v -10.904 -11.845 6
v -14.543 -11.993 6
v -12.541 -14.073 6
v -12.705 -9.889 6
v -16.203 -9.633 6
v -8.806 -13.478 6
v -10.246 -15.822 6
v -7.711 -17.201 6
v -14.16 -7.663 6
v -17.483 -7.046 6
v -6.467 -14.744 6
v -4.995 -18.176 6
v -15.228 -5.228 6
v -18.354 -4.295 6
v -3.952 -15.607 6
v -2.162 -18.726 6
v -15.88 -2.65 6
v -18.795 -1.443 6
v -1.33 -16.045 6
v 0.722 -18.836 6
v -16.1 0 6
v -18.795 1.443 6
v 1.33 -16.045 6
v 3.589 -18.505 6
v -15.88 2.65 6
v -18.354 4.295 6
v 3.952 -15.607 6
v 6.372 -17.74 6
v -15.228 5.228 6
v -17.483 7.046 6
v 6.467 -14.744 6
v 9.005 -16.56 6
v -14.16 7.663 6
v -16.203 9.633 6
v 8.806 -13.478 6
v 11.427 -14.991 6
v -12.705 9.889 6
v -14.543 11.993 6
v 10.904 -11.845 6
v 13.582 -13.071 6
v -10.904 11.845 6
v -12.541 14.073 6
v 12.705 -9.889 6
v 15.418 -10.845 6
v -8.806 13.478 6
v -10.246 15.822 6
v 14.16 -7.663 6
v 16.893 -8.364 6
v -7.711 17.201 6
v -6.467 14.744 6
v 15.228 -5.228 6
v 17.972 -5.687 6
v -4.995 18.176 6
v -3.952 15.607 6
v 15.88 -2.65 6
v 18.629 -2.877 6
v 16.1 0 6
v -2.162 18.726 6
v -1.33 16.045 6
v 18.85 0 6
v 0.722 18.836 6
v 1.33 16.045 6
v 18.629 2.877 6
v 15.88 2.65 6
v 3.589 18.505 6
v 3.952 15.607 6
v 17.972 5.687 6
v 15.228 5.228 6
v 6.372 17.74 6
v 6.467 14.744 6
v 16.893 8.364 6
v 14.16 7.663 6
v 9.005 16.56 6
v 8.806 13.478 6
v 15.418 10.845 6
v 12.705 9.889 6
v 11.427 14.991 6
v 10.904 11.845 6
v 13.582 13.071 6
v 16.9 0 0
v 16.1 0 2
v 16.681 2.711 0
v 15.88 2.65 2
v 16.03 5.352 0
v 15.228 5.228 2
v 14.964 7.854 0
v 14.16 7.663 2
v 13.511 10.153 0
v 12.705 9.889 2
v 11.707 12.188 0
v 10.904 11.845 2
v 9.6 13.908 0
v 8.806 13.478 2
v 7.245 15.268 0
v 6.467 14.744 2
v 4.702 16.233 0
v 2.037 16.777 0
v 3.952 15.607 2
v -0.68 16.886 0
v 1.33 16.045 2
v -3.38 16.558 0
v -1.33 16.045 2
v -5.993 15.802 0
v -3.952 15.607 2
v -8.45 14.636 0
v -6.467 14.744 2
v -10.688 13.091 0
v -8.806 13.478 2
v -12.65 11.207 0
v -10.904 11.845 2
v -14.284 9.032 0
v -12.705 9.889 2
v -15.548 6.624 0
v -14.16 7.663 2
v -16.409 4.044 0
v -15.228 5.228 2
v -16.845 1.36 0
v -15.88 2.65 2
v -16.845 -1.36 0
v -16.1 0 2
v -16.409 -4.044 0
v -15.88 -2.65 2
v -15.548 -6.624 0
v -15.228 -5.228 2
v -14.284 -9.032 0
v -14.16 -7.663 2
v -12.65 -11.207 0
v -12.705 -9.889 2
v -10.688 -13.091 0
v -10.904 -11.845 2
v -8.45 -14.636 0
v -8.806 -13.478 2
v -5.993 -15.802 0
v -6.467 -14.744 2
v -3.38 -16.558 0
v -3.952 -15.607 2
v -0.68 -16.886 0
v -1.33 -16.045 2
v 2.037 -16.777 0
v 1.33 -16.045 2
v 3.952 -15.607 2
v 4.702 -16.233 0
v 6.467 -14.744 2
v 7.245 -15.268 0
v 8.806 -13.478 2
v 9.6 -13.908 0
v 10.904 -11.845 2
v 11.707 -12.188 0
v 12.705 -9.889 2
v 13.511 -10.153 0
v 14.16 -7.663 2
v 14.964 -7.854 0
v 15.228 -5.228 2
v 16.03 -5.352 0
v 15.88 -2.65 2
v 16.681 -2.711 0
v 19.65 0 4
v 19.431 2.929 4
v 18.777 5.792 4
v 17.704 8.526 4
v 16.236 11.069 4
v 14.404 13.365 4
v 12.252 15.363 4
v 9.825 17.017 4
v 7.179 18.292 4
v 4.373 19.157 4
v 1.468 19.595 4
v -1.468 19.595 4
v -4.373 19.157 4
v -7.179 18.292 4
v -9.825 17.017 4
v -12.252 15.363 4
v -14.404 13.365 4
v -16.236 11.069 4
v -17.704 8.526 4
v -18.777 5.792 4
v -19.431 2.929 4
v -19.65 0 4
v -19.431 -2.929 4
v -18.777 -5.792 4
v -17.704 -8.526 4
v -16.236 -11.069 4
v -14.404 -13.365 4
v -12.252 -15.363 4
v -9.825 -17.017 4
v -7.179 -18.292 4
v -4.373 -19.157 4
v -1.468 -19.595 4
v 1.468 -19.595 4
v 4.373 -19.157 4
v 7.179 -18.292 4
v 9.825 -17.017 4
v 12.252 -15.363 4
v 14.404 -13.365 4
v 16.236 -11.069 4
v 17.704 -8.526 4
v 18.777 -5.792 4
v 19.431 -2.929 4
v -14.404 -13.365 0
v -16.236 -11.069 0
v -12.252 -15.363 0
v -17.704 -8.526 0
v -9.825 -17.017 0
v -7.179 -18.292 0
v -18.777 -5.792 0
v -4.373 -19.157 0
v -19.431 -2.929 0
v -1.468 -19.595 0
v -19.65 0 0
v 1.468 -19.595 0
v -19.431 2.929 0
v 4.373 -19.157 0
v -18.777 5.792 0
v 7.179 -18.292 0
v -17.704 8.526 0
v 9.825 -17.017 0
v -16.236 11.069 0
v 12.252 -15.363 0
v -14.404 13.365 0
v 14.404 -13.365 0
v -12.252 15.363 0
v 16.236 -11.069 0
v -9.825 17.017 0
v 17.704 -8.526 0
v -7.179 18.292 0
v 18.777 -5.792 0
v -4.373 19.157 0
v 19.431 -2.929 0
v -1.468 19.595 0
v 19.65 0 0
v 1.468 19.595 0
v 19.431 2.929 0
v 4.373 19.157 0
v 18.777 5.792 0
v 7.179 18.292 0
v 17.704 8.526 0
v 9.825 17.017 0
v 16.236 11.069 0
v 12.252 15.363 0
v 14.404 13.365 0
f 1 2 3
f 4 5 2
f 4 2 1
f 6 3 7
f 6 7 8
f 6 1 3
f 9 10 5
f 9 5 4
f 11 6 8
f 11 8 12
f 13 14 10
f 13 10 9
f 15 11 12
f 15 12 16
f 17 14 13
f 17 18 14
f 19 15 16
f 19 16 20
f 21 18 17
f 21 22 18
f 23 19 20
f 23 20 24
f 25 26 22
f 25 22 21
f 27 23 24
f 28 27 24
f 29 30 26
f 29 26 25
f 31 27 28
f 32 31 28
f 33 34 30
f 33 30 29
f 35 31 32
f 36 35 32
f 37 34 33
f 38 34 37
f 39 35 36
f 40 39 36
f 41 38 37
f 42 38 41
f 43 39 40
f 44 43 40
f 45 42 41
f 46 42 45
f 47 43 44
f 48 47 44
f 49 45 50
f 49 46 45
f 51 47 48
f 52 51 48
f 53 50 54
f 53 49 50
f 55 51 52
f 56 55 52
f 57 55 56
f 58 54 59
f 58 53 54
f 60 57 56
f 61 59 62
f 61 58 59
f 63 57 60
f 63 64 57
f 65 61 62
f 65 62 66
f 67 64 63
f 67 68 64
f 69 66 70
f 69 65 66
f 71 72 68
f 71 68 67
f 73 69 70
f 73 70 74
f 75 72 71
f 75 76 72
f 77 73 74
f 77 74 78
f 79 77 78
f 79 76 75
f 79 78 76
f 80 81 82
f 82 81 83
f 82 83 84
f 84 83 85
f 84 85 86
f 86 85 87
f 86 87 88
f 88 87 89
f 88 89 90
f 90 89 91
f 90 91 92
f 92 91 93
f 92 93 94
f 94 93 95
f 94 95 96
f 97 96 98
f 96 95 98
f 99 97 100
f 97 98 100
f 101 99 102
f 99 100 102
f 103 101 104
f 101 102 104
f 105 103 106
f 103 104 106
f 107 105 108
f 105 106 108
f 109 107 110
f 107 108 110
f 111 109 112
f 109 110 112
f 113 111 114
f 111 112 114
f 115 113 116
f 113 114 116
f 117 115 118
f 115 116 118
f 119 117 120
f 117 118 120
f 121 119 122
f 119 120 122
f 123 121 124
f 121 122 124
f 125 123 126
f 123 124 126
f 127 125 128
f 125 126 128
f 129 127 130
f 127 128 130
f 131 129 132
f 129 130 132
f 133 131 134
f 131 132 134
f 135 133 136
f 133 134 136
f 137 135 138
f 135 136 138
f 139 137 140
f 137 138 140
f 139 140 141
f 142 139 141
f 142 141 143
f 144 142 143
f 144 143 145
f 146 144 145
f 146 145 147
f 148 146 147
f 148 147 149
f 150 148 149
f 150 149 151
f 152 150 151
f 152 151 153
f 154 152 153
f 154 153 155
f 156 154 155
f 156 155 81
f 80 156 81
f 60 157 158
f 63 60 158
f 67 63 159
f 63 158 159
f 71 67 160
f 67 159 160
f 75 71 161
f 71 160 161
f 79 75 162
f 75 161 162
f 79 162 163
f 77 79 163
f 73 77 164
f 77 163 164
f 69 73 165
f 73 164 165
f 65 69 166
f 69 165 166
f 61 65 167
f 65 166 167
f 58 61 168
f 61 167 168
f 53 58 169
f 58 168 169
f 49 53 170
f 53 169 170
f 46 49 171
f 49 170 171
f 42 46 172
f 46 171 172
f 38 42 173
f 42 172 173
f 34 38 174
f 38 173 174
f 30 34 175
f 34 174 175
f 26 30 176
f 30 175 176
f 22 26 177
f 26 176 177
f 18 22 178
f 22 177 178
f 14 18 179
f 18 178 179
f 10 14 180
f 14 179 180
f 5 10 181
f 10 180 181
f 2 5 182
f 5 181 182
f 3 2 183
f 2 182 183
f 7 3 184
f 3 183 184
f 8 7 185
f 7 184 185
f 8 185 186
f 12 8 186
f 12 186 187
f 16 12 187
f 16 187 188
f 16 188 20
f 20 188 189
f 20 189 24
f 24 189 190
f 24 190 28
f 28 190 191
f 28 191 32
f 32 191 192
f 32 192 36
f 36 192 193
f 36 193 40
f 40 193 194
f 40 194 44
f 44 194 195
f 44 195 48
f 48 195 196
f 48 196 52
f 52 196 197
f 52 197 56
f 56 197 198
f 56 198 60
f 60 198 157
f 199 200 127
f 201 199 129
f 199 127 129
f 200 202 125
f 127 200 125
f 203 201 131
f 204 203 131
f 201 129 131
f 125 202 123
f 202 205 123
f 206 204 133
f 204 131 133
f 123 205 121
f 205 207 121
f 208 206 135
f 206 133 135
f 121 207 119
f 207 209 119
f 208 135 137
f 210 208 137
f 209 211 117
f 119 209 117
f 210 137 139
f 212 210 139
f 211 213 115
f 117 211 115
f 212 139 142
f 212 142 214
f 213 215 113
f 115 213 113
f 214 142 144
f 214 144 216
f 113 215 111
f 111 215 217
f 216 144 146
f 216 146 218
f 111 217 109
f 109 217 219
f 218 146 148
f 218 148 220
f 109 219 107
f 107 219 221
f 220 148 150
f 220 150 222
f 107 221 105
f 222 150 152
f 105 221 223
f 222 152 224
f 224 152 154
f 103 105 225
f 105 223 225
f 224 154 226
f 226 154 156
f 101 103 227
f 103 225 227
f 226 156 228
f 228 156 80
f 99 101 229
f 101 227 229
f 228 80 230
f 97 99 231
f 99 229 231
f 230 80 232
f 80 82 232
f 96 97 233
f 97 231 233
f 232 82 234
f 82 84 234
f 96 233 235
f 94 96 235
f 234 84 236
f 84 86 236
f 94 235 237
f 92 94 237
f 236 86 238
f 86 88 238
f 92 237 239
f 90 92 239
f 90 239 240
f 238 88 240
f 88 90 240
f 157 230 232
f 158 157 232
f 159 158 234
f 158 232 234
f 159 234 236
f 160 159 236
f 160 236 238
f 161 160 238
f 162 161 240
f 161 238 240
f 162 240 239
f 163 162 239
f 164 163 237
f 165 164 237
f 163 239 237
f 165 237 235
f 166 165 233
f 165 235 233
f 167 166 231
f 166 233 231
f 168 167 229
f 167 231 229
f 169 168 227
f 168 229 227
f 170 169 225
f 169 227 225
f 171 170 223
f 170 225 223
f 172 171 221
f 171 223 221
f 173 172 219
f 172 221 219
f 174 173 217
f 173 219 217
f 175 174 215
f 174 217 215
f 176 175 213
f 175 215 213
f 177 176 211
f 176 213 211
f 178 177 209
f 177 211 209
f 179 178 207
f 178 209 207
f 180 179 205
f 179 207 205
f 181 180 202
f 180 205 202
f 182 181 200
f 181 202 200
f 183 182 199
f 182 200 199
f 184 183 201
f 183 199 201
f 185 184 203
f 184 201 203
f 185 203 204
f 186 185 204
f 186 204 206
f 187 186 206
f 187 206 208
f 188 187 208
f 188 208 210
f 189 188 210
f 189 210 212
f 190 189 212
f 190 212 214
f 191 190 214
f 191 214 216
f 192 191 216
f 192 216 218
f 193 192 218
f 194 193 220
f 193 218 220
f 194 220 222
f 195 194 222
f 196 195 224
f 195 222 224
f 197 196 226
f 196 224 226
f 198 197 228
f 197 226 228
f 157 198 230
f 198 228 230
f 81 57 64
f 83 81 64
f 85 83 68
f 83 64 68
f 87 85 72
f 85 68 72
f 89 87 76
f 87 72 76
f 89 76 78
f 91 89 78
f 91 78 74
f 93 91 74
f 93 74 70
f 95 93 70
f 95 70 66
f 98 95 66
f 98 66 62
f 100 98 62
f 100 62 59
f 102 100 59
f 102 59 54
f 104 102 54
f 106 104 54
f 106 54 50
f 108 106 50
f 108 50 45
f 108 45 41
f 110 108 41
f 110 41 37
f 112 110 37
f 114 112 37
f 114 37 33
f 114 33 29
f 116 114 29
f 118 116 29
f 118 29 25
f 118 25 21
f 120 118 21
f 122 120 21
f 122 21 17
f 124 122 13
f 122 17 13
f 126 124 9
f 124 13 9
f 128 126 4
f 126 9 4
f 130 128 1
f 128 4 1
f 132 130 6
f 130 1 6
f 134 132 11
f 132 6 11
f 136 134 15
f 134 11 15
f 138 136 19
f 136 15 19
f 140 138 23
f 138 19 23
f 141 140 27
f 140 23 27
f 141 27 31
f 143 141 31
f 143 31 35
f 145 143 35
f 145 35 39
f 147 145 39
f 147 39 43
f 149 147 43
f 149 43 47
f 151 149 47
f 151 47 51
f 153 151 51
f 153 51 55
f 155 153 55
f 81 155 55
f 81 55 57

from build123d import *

# Parameters (mm, degrees)
F0_R     = 19.65
F1_DEPTH = 6
F2_R     = 16.1
F3_DEPTH = 25
F4_SIZE2 = 2
F4_SIZE  = 0.8
F5_SIZE2 = 2
F5_SIZE  = 0.8


with BuildPart() as f1:
    # F0 (on Top) → F1 (new body)
    with BuildSketch(Plane.XY):
        Circle(F0_R)
    extrude(amount=F1_DEPTH)

    # F2 (on face) → F3 (cut)
    with BuildSketch(Plane.XY.offset(6)):
        Circle(F2_R)
    extrude(amount=-F3_DEPTH, mode=Mode.SUBTRACT)

    # F4
    f4_edges = [f1.edges().sort_by_distance(p)[0] for p in [
        (-16.1, 0, 0),
    ]]
    chamfer(f4_edges, length=F4_SIZE, length2=F4_SIZE2)

    # F5
    f5_edges = [f1.edges().sort_by_distance(p)[0] for p in [
        (-19.65, 0, 6),
    ]]
    f5_side = f1.faces().sort_by_distance((-19.094214, 0, 6))[0]
    chamfer(f5_edges, length=F5_SIZE, length2=F5_SIZE2, reference=f5_side)


solid = f1.part
